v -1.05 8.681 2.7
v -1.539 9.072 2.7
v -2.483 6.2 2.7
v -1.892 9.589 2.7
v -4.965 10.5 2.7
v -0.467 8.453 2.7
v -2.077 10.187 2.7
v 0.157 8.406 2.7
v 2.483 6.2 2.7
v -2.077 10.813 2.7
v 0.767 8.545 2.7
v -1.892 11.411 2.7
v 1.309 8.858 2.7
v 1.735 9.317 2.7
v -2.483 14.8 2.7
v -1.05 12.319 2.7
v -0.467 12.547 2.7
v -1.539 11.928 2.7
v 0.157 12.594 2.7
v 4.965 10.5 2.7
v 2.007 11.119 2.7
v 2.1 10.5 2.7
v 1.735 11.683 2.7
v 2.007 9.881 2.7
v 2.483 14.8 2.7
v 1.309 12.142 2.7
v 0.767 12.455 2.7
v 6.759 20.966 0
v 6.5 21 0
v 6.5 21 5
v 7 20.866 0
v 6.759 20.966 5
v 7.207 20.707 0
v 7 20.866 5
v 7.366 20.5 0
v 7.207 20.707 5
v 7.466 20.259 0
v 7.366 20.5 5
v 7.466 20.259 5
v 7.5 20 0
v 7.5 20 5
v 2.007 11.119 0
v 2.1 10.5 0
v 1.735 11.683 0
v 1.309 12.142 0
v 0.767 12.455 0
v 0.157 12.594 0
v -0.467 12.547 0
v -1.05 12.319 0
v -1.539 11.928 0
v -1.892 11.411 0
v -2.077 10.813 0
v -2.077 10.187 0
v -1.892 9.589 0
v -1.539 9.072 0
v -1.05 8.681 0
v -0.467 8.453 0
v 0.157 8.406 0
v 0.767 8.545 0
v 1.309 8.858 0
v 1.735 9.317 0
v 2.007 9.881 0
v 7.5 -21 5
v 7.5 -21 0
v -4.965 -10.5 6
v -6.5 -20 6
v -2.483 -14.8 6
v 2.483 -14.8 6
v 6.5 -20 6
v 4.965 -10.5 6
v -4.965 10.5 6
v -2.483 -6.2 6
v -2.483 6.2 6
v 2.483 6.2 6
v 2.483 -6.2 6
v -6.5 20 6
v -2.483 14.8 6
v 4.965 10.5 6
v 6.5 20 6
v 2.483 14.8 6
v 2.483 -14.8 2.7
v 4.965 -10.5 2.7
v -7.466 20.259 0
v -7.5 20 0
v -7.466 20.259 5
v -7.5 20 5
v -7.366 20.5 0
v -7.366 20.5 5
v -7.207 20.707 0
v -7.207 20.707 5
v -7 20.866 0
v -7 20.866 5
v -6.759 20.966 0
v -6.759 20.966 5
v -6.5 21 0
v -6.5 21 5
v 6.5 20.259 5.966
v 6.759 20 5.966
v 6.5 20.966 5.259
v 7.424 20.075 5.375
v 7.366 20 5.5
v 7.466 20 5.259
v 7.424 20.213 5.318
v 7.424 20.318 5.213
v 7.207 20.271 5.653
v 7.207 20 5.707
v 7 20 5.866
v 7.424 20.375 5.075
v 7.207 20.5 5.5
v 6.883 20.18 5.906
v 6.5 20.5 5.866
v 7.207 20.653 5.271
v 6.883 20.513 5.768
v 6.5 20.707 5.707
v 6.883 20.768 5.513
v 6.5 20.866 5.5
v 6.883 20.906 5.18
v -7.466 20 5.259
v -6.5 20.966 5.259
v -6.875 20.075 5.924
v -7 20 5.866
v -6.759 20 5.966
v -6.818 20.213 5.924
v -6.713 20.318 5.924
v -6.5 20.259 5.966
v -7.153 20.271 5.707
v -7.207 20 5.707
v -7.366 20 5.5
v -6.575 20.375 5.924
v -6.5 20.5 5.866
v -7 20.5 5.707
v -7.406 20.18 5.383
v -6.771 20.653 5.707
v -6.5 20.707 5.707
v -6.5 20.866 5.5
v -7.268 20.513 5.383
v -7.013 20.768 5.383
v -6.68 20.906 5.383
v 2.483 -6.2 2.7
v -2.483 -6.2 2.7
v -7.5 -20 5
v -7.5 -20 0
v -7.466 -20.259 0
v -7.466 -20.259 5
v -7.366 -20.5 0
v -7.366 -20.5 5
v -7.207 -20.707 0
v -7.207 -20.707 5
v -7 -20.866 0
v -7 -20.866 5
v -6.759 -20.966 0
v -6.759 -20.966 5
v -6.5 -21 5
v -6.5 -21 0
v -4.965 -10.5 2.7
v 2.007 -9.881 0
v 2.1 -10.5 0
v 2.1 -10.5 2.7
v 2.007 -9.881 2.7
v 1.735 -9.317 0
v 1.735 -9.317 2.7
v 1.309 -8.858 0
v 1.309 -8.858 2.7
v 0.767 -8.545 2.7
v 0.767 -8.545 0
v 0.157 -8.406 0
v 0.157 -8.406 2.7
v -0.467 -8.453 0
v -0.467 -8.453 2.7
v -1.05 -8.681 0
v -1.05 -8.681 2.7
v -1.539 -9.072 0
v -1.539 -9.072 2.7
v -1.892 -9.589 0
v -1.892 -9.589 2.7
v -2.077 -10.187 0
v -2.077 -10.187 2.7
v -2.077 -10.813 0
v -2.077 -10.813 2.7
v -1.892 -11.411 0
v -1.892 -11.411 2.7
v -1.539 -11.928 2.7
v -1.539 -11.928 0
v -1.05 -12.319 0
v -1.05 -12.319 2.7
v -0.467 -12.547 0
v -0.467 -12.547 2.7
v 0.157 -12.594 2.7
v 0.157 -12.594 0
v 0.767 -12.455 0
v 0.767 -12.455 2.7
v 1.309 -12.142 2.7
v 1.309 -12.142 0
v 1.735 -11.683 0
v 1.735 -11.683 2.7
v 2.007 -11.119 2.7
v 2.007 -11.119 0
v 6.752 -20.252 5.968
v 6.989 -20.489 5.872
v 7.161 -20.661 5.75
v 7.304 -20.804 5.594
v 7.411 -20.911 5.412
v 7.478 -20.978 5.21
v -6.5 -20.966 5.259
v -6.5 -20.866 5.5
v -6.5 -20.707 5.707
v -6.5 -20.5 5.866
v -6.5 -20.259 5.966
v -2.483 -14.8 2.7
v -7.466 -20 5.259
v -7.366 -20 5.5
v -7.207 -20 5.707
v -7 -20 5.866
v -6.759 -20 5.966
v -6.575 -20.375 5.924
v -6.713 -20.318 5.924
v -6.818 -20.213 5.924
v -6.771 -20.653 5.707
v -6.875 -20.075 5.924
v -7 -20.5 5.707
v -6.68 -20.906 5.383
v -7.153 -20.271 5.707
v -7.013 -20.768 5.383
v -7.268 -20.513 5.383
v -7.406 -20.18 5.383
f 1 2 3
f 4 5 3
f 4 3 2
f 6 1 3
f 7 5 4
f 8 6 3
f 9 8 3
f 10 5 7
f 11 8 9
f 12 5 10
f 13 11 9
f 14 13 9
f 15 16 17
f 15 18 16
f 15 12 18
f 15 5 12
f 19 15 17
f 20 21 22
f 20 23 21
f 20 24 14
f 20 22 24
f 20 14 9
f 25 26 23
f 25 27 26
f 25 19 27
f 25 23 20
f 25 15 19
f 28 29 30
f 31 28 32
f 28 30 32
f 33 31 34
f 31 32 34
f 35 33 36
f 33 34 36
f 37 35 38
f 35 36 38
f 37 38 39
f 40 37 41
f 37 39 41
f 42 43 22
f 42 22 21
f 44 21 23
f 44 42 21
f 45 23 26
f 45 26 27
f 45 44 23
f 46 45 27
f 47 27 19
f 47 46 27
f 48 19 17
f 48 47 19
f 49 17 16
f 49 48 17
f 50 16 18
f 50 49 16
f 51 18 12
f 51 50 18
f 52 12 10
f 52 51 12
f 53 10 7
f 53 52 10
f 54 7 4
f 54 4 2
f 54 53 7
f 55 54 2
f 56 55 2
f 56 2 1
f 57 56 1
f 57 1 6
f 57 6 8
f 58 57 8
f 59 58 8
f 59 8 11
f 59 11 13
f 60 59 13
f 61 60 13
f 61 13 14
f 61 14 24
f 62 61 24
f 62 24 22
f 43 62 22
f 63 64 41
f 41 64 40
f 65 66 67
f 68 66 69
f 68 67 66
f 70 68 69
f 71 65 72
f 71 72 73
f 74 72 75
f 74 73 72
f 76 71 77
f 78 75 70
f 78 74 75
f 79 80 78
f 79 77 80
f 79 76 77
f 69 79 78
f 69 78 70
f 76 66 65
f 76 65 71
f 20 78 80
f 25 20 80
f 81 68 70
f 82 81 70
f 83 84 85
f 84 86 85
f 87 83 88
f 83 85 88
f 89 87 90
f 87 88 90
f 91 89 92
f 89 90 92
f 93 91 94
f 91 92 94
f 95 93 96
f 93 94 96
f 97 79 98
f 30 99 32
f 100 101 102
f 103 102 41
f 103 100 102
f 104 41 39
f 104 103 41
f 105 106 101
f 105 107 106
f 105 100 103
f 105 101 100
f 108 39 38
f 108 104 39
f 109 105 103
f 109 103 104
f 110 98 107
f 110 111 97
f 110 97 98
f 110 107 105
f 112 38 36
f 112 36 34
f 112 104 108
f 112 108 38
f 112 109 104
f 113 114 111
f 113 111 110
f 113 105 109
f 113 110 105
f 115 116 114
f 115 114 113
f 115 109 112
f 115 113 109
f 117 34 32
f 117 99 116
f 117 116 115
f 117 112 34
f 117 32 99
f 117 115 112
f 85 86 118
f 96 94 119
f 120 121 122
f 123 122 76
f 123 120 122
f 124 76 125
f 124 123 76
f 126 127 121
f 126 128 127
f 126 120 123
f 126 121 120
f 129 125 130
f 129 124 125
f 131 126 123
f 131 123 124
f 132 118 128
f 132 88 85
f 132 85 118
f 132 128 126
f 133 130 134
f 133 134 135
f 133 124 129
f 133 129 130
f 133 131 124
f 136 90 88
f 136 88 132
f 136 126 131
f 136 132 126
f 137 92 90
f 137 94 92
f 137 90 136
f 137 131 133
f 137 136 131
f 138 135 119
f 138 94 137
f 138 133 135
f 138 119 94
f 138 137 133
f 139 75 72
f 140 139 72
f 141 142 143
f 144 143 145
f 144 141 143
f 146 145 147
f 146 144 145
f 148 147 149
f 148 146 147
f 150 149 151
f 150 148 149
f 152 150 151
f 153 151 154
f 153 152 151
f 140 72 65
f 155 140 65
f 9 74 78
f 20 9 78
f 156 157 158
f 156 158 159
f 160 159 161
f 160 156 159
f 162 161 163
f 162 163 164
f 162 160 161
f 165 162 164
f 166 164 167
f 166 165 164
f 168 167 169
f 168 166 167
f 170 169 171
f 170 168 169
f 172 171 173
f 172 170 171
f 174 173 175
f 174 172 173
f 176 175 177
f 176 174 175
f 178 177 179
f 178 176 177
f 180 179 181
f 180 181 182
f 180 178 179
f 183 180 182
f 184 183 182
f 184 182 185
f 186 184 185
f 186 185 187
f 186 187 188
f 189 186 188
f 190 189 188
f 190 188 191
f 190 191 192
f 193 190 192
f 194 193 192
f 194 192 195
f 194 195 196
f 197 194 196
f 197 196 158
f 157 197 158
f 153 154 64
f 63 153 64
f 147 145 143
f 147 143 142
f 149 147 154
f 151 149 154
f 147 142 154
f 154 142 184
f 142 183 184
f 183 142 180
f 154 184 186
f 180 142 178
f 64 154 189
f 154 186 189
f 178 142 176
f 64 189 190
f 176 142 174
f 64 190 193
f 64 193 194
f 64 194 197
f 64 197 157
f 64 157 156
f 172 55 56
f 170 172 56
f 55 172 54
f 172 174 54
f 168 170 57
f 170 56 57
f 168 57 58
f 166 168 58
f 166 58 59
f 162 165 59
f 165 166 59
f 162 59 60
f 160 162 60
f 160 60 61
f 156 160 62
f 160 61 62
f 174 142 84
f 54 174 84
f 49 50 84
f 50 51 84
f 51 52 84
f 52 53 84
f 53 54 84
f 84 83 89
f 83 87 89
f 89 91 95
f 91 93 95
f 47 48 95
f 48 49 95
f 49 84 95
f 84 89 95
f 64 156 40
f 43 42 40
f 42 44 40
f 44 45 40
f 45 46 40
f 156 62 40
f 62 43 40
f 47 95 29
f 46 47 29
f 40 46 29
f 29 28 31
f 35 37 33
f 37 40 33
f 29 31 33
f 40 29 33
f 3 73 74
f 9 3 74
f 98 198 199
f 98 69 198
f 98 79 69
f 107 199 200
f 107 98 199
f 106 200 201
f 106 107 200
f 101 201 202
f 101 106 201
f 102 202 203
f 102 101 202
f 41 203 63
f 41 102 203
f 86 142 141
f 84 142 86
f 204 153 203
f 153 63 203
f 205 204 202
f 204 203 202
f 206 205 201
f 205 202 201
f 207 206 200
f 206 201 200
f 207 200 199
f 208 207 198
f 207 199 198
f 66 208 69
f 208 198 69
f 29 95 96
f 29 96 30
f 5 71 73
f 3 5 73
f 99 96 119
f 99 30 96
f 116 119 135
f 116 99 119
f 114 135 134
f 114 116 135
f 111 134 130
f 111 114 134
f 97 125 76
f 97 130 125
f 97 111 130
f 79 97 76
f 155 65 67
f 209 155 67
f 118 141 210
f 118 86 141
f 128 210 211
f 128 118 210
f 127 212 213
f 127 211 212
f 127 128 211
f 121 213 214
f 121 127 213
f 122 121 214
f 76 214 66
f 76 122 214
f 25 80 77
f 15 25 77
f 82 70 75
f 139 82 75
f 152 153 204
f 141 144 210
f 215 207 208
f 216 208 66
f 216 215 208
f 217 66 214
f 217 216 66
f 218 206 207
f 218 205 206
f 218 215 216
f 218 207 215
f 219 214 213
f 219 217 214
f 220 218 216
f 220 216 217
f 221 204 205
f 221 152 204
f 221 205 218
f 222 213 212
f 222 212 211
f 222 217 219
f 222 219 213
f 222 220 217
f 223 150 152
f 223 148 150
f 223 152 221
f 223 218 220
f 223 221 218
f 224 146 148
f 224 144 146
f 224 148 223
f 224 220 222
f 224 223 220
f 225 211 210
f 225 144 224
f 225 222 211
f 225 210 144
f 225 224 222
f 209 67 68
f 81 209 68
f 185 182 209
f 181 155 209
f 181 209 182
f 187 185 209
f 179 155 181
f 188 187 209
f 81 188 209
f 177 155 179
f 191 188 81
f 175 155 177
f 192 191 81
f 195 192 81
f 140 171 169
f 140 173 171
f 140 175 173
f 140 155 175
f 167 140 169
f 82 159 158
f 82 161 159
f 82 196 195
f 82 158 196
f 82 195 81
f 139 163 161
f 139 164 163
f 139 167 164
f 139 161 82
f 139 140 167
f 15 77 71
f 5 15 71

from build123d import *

# Parameters (mm, degrees)
F0_W     = 15
F0_H     = 42
F0_R     = 2.1
F1_DEPTH = 6
F2_DEPTH = 6.001
F3_R     = 2.1
F4_DEPTH = 3.3
F5_R     = 1


# Not quite as in the source:
# - a feature names something its author has since deleted; it is built from what else it names


with BuildPart() as f1:
    # F0 (on Top) → F1 (new body)
    with BuildSketch(Plane.XY):
        Rectangle(F0_W, F0_H)
        with Locations((0, -10.5)):
            Circle(F0_R, mode=Mode.SUBTRACT)
        with Locations((0, 10.5)):
            Circle(F0_R, mode=Mode.SUBTRACT)
        with Locations((0, -10.5)):
            Circle(F0_R)
        with Locations((0, 10.5)):
            Circle(F0_R)
    extrude(amount=F1_DEPTH)

    # F0 (on Top) → F2 (cut, through all)
    with BuildSketch(Plane.XY):
        with Locations((0, 10.5)):
            Circle(F0_R)
        with Locations((0, -10.5)):
            Circle(F0_R)
    extrude(amount=F2_DEPTH, mode=Mode.SUBTRACT)

    # F3 (on face) → F4 (cut)
    with BuildSketch(Plane.XY.offset(6)):
        Polygon((4.965212315, -10.5), (2.4826061575, -6.2), (-2.4826061575, -6.2), (-4.965212315, -10.5), (-2.4826061575, -14.8), (2.4826061575, -14.8), align=None)
        with Locations((0, -10.5)):
            Circle(F3_R, mode=Mode.SUBTRACT)
        Polygon((4.965212315, 10.5), (2.4826061575, 14.8), (-2.4826061575, 14.8), (-4.965212315, 10.5), (-2.4826061575, 6.2), (2.4826061575, 6.2), align=None)
        with Locations((0, 10.5)):
            Circle(F3_R, mode=Mode.SUBTRACT)
    extrude(amount=-F4_DEPTH, mode=Mode.SUBTRACT)

    # F5
    f5_edges = [f1.edges().sort_by_distance(p)[0] for p in [
        (-7.5, 21, 3),
        (-7.5, -21, 3),
        (0, -21, 6),
        (-7.5, 0, 6),
        (0, 21, 6),
        (7.5, 0, 6),
        (7.5, 21, 3),
    ]]
    fillet(f5_edges, radius=F5_R)


solid = f1.part
